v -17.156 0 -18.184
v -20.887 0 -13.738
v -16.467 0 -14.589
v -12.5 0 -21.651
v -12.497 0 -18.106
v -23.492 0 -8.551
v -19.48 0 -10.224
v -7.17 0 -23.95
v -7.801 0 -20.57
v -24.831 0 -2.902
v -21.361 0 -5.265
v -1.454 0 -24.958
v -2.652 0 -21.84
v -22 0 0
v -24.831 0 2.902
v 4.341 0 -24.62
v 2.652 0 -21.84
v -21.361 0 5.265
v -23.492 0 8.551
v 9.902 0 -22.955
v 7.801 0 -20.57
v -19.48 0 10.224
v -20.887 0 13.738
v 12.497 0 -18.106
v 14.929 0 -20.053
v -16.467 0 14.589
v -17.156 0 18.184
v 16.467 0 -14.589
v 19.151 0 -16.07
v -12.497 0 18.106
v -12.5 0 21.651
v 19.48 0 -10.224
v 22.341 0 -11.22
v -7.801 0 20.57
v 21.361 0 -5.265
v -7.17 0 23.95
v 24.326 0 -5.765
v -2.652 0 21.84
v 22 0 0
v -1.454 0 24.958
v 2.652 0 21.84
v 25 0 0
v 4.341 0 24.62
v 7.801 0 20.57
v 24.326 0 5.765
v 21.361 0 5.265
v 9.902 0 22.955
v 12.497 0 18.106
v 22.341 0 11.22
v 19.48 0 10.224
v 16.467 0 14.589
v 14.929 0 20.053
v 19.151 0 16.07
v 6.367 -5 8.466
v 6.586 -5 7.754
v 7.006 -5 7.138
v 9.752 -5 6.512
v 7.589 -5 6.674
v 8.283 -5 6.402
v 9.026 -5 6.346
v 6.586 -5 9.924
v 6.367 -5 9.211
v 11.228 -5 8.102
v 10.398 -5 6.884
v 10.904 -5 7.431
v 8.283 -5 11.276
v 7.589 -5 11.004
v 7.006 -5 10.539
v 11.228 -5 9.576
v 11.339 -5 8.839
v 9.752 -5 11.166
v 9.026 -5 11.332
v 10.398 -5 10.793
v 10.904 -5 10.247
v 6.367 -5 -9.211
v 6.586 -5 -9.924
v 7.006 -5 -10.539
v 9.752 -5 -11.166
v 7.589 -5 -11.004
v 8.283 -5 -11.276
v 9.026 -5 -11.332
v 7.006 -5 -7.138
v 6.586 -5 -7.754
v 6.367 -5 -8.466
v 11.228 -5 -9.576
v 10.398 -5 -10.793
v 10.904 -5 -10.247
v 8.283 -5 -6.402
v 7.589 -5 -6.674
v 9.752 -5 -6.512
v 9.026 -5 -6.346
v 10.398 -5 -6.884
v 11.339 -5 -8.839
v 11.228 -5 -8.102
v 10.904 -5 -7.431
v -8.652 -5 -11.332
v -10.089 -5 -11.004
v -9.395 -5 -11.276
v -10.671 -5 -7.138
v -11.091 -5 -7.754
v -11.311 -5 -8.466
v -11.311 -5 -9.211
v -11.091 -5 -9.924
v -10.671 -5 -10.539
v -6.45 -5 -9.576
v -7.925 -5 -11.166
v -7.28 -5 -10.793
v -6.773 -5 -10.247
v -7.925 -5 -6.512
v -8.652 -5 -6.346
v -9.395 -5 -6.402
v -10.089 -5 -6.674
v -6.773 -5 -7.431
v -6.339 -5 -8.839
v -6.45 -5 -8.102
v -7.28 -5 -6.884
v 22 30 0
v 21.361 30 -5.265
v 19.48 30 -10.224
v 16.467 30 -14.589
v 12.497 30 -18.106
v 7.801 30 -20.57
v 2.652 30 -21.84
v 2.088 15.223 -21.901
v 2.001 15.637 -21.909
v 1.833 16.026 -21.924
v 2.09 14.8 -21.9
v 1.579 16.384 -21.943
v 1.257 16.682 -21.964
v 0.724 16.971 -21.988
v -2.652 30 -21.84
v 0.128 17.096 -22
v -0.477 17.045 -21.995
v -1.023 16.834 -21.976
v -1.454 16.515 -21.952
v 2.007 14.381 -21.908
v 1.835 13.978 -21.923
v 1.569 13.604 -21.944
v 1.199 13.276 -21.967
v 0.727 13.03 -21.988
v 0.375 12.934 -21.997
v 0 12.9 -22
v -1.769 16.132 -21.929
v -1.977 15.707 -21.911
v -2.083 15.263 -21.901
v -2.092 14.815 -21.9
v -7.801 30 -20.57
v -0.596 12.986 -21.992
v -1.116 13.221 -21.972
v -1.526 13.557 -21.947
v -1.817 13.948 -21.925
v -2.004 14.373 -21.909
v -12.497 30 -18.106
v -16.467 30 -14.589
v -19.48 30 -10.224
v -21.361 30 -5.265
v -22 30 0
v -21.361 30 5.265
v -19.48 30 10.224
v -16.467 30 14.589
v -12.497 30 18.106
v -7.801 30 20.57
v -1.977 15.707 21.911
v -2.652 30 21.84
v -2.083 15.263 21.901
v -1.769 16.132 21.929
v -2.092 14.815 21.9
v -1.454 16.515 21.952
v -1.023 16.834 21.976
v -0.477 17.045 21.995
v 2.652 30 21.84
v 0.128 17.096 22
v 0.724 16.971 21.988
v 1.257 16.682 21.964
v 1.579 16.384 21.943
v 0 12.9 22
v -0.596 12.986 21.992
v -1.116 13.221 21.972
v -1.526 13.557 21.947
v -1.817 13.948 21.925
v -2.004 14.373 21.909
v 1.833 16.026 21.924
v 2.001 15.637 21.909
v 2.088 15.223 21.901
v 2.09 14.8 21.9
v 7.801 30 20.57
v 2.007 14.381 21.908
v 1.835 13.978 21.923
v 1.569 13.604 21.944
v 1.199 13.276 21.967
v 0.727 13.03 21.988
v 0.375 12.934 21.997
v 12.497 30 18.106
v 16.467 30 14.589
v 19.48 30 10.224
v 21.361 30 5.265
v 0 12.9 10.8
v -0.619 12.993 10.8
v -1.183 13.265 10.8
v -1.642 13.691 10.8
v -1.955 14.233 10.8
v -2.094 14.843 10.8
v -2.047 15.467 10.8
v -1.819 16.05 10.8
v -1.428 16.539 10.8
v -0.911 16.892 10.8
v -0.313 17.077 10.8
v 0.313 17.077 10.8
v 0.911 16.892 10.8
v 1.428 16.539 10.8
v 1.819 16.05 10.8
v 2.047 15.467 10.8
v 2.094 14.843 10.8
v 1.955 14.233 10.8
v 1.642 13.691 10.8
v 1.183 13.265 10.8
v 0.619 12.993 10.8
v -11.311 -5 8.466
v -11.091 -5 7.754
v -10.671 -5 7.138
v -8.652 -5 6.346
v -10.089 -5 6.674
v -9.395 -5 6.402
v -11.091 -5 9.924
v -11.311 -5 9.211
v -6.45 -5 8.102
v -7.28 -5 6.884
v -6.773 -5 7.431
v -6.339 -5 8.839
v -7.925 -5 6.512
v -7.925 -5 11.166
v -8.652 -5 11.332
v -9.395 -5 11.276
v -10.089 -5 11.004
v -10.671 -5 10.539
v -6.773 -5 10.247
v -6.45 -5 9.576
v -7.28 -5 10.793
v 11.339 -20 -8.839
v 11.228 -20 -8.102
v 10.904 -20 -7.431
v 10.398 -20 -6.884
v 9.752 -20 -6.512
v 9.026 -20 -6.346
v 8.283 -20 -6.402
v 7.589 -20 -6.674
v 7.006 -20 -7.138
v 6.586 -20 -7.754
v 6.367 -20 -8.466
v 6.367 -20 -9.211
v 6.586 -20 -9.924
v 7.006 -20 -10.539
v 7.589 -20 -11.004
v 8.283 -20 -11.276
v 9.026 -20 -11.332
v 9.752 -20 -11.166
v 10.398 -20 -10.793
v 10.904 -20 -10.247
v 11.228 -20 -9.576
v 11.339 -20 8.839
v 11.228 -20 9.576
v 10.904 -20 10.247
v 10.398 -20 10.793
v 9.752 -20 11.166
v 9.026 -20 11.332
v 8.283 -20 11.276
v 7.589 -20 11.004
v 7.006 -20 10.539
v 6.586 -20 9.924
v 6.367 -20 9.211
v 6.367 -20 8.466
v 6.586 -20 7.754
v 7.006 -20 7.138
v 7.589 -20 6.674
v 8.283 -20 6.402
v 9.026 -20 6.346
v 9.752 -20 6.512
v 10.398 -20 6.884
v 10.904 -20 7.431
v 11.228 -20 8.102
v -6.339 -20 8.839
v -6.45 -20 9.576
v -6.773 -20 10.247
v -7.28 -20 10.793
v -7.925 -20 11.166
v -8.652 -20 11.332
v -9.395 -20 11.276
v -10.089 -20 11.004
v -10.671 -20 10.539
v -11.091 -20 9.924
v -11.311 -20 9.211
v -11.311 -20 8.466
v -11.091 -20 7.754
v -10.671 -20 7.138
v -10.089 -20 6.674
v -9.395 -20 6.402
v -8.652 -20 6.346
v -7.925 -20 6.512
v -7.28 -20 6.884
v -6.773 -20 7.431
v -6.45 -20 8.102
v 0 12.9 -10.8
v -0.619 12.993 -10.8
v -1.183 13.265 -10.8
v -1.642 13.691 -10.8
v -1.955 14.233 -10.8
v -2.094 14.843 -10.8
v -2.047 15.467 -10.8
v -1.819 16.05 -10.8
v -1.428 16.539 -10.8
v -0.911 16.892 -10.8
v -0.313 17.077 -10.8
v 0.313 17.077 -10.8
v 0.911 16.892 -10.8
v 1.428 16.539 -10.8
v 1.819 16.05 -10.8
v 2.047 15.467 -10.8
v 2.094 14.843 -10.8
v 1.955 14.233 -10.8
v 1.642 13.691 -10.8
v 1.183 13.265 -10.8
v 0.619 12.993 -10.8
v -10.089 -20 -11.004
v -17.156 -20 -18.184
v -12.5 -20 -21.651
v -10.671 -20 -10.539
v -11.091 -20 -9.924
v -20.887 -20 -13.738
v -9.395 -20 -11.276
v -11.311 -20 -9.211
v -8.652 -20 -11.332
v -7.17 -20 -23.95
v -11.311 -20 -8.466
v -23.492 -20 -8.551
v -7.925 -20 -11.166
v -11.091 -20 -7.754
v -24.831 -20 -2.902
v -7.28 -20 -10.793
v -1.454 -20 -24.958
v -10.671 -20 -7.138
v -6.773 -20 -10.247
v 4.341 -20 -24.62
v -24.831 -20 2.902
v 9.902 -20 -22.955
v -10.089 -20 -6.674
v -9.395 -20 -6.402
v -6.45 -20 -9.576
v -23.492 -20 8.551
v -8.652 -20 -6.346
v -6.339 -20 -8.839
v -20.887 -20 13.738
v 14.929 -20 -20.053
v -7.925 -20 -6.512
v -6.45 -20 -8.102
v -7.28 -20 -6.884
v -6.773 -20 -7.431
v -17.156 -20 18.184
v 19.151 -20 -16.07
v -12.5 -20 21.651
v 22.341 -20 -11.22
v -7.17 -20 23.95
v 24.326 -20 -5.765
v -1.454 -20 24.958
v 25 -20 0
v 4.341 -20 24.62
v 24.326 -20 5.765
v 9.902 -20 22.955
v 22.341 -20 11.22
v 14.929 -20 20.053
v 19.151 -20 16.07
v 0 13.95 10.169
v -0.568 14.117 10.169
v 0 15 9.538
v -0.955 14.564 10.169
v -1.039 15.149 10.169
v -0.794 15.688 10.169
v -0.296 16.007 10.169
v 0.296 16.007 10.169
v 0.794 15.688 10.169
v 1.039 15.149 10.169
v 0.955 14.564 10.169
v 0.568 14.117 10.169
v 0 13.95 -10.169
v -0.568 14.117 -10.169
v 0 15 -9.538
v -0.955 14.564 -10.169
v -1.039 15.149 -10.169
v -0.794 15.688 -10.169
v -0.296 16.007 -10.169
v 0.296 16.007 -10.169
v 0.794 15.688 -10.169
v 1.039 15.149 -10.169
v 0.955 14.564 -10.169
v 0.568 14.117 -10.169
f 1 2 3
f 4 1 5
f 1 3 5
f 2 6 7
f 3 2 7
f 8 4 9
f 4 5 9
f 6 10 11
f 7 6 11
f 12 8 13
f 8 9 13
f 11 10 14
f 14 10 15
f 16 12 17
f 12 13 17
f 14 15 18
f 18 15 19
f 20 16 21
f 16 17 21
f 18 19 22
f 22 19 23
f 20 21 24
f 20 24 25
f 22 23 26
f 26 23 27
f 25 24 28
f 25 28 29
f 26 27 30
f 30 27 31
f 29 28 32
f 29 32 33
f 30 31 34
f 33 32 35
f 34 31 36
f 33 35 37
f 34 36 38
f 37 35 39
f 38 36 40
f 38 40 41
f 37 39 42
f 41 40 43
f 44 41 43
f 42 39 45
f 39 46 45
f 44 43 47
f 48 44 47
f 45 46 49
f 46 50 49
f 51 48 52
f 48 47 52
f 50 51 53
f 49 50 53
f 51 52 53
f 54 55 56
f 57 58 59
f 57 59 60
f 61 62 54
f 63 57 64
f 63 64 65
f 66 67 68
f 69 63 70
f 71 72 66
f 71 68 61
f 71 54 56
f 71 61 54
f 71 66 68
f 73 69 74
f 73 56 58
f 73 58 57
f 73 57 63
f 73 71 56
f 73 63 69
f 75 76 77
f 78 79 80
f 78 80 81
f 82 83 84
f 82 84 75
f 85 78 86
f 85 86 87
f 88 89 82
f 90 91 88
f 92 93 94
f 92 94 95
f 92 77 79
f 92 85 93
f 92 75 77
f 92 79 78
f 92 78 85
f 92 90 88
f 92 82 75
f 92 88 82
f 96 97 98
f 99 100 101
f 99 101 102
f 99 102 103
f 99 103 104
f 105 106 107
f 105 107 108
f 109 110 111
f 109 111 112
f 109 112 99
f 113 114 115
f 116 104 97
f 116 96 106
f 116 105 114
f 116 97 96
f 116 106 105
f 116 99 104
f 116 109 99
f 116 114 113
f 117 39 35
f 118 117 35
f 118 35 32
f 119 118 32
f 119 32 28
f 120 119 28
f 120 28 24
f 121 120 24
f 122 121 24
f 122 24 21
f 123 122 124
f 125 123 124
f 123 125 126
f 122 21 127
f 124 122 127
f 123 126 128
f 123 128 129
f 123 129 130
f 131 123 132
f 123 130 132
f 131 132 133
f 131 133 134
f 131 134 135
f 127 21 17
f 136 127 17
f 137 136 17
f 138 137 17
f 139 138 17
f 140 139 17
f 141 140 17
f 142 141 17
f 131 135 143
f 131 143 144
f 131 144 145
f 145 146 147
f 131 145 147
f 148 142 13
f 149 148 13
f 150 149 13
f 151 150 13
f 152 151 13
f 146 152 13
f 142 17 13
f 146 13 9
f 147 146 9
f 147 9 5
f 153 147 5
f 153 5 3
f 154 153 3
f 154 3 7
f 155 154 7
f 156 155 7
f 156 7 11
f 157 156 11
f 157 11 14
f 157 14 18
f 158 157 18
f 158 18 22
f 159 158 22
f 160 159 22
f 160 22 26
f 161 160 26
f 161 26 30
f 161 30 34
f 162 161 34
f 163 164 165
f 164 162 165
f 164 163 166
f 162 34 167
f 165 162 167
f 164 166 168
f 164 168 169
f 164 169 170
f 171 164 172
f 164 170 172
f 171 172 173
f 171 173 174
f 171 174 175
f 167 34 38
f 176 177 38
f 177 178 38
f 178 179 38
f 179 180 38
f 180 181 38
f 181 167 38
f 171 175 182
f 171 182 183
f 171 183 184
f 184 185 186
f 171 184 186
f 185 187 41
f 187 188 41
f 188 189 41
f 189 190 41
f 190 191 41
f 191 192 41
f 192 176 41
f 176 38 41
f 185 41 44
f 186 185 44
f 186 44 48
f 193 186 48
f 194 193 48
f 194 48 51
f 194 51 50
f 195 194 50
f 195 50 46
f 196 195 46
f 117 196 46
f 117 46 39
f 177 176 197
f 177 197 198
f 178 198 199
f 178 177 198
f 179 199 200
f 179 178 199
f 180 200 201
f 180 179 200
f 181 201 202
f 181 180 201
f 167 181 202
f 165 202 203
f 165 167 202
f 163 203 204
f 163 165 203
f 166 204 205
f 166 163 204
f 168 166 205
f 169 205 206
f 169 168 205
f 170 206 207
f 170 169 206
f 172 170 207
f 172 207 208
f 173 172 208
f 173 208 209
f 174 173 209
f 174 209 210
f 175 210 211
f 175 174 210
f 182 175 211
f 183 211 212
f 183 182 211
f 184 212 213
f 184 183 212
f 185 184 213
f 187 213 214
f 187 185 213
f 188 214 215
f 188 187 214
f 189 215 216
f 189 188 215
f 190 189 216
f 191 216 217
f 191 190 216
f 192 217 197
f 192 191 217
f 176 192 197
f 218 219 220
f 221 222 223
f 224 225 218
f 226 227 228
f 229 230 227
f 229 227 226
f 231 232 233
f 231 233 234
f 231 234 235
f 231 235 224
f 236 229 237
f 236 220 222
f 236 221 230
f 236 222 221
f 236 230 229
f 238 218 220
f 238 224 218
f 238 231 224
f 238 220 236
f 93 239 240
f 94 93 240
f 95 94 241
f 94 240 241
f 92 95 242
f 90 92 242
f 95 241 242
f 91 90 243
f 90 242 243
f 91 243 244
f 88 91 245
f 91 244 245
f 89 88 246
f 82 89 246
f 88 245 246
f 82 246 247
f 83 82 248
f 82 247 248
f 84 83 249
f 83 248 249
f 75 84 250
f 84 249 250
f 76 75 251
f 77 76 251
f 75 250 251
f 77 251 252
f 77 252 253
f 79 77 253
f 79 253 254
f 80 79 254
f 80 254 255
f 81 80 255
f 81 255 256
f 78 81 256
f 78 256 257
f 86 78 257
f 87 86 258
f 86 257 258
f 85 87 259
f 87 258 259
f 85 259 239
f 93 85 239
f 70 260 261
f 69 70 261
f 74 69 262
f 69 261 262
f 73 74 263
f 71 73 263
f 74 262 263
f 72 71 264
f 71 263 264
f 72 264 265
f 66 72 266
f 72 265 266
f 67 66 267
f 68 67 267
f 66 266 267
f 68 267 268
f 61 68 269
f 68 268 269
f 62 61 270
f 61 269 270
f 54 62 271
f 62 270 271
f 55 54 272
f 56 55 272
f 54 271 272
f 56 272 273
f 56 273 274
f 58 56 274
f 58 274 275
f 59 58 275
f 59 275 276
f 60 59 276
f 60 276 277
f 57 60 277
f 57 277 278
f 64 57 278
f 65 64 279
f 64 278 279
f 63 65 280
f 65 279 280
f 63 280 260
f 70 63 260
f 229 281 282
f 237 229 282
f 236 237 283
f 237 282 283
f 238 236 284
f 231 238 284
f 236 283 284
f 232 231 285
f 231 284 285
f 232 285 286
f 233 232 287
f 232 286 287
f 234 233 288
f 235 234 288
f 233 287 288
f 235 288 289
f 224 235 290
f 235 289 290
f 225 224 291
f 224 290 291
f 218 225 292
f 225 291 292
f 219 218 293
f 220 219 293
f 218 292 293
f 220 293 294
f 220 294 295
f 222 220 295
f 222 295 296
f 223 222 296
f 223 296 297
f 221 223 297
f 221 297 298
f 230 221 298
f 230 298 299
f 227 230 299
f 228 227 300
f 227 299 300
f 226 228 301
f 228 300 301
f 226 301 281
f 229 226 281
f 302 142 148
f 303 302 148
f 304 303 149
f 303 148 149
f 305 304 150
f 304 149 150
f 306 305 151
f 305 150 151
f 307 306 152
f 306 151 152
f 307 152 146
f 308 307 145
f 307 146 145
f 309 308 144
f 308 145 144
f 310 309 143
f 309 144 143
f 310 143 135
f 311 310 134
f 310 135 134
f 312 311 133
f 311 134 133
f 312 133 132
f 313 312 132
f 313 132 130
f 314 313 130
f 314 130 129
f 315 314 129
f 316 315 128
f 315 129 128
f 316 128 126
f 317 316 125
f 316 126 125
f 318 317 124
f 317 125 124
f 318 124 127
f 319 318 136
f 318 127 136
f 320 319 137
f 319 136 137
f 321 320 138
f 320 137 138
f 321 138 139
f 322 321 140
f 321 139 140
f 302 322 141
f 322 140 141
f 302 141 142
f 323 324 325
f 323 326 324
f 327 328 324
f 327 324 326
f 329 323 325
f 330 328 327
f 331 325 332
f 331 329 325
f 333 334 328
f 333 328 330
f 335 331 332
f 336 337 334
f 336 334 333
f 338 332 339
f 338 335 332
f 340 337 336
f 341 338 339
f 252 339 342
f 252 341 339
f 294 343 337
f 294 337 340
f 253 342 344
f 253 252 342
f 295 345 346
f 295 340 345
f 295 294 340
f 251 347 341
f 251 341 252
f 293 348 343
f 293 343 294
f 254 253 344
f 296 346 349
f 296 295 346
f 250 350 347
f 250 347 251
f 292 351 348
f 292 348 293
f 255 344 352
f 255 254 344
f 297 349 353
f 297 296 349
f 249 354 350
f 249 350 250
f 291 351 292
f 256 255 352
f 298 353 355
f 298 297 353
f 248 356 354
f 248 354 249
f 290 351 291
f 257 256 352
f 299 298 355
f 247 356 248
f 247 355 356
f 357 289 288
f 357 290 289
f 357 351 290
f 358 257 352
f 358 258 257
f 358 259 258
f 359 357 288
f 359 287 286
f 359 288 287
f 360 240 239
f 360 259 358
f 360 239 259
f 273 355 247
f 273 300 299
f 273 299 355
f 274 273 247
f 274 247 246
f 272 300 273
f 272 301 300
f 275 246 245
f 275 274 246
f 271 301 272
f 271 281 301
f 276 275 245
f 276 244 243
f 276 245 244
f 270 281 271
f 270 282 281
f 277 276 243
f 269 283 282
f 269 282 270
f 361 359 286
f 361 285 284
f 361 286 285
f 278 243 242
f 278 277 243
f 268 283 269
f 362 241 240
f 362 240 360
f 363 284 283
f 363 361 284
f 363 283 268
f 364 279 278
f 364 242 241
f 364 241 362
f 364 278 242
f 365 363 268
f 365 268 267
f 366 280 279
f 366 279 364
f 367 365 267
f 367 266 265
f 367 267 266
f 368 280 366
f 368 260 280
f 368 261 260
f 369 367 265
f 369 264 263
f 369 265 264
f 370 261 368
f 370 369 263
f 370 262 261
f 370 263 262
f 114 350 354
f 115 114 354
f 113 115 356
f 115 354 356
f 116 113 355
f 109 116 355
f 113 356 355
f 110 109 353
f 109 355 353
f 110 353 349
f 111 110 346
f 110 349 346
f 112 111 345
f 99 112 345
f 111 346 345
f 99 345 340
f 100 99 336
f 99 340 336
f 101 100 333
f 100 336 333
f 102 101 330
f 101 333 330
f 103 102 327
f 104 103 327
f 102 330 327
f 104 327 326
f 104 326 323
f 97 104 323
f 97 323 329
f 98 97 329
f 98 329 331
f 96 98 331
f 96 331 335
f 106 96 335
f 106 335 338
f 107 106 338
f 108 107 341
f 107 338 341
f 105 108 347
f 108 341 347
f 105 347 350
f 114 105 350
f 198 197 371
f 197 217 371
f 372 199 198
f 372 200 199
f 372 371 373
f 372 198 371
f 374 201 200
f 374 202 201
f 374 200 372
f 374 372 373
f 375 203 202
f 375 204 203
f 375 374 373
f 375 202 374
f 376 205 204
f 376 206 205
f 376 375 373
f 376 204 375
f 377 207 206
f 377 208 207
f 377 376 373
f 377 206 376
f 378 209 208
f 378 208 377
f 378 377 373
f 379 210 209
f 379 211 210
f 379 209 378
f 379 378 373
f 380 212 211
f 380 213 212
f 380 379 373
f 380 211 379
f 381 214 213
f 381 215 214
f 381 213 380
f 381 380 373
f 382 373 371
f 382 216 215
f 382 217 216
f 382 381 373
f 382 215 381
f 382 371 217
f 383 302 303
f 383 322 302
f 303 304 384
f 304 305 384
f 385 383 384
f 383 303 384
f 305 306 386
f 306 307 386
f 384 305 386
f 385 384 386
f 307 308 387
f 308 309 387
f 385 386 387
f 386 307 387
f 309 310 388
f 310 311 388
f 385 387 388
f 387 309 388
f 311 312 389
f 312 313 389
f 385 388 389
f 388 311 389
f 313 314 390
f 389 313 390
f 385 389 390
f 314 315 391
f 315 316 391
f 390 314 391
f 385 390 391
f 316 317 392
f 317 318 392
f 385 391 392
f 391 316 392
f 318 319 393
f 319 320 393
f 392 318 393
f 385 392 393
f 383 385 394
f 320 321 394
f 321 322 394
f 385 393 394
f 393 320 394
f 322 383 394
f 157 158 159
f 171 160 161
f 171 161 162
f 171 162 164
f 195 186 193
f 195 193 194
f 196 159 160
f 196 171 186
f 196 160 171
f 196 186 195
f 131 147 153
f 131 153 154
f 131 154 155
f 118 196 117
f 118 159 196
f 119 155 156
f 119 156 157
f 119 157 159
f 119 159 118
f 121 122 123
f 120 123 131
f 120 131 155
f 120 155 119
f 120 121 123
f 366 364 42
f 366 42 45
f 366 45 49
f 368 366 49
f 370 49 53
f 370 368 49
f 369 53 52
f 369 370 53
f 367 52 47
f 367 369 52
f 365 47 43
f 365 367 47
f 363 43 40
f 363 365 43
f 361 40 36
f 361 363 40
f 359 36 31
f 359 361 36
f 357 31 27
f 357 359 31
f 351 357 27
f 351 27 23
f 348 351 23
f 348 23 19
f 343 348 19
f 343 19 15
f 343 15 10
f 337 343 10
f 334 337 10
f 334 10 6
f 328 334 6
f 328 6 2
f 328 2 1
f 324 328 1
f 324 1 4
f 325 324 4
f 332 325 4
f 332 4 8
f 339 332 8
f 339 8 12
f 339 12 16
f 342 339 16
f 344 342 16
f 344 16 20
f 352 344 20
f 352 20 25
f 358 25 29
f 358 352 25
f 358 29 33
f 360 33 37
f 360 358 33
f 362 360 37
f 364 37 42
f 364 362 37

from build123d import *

# Parameters (mm, degrees)
ESBO_O1_R                = 22
RESSALTO_EXTRUS_O1_DEPTH = 30
ESBO_O2_W                = 51.6
ESBO_O2_H                = 51.6
RESSALTO_EXTRUS_O2_DEPTH = 20
CORTE_EXTRUS_O4_REACH    = 52
ESBO_O17_W               = 51.6
ESBO_O17_H               = 51.6
ESBO_O17_R               = 25
ESBO_O18_R               = 2.5
CORTE_EXTRUS_O5_DEPTH    = 15


with BuildPart() as part:
    # Esboço1 → Ressalto-extrusão1 (new body)
    with BuildSketch(Plane(origin=(0, 0, 0), x_dir=(1, 0, 0), z_dir=(0, 1, 0))):
        Circle(ESBO_O1_R)
    extrude(amount=RESSALTO_EXTRUS_O1_DEPTH)

    # Esboço2 → Ressalto-extrusão2 (add)
    with BuildSketch(Plane.XZ):
        Rectangle(ESBO_O2_W, ESBO_O2_H)
    extrude(amount=RESSALTO_EXTRUS_O2_DEPTH)

    # Esboço13 → Broca de rosquear para tarraxa de M52 (revolve, cut)
    with BuildSketch(Plane(origin=(0, 15, 25.8), x_dir=(0, -1, 0), z_dir=(1, 0, 0))):
        Polygon((0, 0), (0, 16.2618073), (2.1, 15), (2.1, 0), align=None)
    broca_de_rosquear_para_tarraxa_de_m52 = revolve(axis=Axis((0, 15, 32.15), (0, 0, -1)), mode=Mode.SUBTRACT)

    # Espelhar1: Broca de rosquear para tarraxa de M52 across plane
    add(broca_de_rosquear_para_tarraxa_de_m52.mirror(Plane.XY), mode=Mode.SUBTRACT)

    # Esboço17 → Corte-extrusão4 (cut, up to next)
    with BuildSketch(Plane.XZ.offset(20), mode=Mode.PRIVATE) as corte_extrus_o4_sk1:
        Rectangle(ESBO_O17_W, ESBO_O17_H)
        Circle(ESBO_O17_R, mode=Mode.SUBTRACT)
    corte_extrus_o4_tool1 = extrude(corte_extrus_o4_sk1.sketch, amount=-CORTE_EXTRUS_O4_REACH, mode=Mode.PRIVATE) & part.part
    add(corte_extrus_o4_tool1.solids().sort_by_distance((25.070266, -20, 0))[0], mode=Mode.SUBTRACT)

    # Esboço18 → Corte-extrusão5 (cut)
    with BuildSketch(Plane.XZ.offset(20)):
        with Locations((8.838834765, 8.838834765)):
            Circle(ESBO_O18_R)
        with Locations((-8.838834765, 8.838834765)):
            Circle(ESBO_O18_R)
        with Locations((8.838834765, -8.838834765)):
            Circle(ESBO_O18_R)
        with Locations((-8.838834765, -8.838834765)):
            Circle(ESBO_O18_R)
    extrude(amount=-CORTE_EXTRUS_O5_DEPTH, mode=Mode.SUBTRACT)


solid = part.part
